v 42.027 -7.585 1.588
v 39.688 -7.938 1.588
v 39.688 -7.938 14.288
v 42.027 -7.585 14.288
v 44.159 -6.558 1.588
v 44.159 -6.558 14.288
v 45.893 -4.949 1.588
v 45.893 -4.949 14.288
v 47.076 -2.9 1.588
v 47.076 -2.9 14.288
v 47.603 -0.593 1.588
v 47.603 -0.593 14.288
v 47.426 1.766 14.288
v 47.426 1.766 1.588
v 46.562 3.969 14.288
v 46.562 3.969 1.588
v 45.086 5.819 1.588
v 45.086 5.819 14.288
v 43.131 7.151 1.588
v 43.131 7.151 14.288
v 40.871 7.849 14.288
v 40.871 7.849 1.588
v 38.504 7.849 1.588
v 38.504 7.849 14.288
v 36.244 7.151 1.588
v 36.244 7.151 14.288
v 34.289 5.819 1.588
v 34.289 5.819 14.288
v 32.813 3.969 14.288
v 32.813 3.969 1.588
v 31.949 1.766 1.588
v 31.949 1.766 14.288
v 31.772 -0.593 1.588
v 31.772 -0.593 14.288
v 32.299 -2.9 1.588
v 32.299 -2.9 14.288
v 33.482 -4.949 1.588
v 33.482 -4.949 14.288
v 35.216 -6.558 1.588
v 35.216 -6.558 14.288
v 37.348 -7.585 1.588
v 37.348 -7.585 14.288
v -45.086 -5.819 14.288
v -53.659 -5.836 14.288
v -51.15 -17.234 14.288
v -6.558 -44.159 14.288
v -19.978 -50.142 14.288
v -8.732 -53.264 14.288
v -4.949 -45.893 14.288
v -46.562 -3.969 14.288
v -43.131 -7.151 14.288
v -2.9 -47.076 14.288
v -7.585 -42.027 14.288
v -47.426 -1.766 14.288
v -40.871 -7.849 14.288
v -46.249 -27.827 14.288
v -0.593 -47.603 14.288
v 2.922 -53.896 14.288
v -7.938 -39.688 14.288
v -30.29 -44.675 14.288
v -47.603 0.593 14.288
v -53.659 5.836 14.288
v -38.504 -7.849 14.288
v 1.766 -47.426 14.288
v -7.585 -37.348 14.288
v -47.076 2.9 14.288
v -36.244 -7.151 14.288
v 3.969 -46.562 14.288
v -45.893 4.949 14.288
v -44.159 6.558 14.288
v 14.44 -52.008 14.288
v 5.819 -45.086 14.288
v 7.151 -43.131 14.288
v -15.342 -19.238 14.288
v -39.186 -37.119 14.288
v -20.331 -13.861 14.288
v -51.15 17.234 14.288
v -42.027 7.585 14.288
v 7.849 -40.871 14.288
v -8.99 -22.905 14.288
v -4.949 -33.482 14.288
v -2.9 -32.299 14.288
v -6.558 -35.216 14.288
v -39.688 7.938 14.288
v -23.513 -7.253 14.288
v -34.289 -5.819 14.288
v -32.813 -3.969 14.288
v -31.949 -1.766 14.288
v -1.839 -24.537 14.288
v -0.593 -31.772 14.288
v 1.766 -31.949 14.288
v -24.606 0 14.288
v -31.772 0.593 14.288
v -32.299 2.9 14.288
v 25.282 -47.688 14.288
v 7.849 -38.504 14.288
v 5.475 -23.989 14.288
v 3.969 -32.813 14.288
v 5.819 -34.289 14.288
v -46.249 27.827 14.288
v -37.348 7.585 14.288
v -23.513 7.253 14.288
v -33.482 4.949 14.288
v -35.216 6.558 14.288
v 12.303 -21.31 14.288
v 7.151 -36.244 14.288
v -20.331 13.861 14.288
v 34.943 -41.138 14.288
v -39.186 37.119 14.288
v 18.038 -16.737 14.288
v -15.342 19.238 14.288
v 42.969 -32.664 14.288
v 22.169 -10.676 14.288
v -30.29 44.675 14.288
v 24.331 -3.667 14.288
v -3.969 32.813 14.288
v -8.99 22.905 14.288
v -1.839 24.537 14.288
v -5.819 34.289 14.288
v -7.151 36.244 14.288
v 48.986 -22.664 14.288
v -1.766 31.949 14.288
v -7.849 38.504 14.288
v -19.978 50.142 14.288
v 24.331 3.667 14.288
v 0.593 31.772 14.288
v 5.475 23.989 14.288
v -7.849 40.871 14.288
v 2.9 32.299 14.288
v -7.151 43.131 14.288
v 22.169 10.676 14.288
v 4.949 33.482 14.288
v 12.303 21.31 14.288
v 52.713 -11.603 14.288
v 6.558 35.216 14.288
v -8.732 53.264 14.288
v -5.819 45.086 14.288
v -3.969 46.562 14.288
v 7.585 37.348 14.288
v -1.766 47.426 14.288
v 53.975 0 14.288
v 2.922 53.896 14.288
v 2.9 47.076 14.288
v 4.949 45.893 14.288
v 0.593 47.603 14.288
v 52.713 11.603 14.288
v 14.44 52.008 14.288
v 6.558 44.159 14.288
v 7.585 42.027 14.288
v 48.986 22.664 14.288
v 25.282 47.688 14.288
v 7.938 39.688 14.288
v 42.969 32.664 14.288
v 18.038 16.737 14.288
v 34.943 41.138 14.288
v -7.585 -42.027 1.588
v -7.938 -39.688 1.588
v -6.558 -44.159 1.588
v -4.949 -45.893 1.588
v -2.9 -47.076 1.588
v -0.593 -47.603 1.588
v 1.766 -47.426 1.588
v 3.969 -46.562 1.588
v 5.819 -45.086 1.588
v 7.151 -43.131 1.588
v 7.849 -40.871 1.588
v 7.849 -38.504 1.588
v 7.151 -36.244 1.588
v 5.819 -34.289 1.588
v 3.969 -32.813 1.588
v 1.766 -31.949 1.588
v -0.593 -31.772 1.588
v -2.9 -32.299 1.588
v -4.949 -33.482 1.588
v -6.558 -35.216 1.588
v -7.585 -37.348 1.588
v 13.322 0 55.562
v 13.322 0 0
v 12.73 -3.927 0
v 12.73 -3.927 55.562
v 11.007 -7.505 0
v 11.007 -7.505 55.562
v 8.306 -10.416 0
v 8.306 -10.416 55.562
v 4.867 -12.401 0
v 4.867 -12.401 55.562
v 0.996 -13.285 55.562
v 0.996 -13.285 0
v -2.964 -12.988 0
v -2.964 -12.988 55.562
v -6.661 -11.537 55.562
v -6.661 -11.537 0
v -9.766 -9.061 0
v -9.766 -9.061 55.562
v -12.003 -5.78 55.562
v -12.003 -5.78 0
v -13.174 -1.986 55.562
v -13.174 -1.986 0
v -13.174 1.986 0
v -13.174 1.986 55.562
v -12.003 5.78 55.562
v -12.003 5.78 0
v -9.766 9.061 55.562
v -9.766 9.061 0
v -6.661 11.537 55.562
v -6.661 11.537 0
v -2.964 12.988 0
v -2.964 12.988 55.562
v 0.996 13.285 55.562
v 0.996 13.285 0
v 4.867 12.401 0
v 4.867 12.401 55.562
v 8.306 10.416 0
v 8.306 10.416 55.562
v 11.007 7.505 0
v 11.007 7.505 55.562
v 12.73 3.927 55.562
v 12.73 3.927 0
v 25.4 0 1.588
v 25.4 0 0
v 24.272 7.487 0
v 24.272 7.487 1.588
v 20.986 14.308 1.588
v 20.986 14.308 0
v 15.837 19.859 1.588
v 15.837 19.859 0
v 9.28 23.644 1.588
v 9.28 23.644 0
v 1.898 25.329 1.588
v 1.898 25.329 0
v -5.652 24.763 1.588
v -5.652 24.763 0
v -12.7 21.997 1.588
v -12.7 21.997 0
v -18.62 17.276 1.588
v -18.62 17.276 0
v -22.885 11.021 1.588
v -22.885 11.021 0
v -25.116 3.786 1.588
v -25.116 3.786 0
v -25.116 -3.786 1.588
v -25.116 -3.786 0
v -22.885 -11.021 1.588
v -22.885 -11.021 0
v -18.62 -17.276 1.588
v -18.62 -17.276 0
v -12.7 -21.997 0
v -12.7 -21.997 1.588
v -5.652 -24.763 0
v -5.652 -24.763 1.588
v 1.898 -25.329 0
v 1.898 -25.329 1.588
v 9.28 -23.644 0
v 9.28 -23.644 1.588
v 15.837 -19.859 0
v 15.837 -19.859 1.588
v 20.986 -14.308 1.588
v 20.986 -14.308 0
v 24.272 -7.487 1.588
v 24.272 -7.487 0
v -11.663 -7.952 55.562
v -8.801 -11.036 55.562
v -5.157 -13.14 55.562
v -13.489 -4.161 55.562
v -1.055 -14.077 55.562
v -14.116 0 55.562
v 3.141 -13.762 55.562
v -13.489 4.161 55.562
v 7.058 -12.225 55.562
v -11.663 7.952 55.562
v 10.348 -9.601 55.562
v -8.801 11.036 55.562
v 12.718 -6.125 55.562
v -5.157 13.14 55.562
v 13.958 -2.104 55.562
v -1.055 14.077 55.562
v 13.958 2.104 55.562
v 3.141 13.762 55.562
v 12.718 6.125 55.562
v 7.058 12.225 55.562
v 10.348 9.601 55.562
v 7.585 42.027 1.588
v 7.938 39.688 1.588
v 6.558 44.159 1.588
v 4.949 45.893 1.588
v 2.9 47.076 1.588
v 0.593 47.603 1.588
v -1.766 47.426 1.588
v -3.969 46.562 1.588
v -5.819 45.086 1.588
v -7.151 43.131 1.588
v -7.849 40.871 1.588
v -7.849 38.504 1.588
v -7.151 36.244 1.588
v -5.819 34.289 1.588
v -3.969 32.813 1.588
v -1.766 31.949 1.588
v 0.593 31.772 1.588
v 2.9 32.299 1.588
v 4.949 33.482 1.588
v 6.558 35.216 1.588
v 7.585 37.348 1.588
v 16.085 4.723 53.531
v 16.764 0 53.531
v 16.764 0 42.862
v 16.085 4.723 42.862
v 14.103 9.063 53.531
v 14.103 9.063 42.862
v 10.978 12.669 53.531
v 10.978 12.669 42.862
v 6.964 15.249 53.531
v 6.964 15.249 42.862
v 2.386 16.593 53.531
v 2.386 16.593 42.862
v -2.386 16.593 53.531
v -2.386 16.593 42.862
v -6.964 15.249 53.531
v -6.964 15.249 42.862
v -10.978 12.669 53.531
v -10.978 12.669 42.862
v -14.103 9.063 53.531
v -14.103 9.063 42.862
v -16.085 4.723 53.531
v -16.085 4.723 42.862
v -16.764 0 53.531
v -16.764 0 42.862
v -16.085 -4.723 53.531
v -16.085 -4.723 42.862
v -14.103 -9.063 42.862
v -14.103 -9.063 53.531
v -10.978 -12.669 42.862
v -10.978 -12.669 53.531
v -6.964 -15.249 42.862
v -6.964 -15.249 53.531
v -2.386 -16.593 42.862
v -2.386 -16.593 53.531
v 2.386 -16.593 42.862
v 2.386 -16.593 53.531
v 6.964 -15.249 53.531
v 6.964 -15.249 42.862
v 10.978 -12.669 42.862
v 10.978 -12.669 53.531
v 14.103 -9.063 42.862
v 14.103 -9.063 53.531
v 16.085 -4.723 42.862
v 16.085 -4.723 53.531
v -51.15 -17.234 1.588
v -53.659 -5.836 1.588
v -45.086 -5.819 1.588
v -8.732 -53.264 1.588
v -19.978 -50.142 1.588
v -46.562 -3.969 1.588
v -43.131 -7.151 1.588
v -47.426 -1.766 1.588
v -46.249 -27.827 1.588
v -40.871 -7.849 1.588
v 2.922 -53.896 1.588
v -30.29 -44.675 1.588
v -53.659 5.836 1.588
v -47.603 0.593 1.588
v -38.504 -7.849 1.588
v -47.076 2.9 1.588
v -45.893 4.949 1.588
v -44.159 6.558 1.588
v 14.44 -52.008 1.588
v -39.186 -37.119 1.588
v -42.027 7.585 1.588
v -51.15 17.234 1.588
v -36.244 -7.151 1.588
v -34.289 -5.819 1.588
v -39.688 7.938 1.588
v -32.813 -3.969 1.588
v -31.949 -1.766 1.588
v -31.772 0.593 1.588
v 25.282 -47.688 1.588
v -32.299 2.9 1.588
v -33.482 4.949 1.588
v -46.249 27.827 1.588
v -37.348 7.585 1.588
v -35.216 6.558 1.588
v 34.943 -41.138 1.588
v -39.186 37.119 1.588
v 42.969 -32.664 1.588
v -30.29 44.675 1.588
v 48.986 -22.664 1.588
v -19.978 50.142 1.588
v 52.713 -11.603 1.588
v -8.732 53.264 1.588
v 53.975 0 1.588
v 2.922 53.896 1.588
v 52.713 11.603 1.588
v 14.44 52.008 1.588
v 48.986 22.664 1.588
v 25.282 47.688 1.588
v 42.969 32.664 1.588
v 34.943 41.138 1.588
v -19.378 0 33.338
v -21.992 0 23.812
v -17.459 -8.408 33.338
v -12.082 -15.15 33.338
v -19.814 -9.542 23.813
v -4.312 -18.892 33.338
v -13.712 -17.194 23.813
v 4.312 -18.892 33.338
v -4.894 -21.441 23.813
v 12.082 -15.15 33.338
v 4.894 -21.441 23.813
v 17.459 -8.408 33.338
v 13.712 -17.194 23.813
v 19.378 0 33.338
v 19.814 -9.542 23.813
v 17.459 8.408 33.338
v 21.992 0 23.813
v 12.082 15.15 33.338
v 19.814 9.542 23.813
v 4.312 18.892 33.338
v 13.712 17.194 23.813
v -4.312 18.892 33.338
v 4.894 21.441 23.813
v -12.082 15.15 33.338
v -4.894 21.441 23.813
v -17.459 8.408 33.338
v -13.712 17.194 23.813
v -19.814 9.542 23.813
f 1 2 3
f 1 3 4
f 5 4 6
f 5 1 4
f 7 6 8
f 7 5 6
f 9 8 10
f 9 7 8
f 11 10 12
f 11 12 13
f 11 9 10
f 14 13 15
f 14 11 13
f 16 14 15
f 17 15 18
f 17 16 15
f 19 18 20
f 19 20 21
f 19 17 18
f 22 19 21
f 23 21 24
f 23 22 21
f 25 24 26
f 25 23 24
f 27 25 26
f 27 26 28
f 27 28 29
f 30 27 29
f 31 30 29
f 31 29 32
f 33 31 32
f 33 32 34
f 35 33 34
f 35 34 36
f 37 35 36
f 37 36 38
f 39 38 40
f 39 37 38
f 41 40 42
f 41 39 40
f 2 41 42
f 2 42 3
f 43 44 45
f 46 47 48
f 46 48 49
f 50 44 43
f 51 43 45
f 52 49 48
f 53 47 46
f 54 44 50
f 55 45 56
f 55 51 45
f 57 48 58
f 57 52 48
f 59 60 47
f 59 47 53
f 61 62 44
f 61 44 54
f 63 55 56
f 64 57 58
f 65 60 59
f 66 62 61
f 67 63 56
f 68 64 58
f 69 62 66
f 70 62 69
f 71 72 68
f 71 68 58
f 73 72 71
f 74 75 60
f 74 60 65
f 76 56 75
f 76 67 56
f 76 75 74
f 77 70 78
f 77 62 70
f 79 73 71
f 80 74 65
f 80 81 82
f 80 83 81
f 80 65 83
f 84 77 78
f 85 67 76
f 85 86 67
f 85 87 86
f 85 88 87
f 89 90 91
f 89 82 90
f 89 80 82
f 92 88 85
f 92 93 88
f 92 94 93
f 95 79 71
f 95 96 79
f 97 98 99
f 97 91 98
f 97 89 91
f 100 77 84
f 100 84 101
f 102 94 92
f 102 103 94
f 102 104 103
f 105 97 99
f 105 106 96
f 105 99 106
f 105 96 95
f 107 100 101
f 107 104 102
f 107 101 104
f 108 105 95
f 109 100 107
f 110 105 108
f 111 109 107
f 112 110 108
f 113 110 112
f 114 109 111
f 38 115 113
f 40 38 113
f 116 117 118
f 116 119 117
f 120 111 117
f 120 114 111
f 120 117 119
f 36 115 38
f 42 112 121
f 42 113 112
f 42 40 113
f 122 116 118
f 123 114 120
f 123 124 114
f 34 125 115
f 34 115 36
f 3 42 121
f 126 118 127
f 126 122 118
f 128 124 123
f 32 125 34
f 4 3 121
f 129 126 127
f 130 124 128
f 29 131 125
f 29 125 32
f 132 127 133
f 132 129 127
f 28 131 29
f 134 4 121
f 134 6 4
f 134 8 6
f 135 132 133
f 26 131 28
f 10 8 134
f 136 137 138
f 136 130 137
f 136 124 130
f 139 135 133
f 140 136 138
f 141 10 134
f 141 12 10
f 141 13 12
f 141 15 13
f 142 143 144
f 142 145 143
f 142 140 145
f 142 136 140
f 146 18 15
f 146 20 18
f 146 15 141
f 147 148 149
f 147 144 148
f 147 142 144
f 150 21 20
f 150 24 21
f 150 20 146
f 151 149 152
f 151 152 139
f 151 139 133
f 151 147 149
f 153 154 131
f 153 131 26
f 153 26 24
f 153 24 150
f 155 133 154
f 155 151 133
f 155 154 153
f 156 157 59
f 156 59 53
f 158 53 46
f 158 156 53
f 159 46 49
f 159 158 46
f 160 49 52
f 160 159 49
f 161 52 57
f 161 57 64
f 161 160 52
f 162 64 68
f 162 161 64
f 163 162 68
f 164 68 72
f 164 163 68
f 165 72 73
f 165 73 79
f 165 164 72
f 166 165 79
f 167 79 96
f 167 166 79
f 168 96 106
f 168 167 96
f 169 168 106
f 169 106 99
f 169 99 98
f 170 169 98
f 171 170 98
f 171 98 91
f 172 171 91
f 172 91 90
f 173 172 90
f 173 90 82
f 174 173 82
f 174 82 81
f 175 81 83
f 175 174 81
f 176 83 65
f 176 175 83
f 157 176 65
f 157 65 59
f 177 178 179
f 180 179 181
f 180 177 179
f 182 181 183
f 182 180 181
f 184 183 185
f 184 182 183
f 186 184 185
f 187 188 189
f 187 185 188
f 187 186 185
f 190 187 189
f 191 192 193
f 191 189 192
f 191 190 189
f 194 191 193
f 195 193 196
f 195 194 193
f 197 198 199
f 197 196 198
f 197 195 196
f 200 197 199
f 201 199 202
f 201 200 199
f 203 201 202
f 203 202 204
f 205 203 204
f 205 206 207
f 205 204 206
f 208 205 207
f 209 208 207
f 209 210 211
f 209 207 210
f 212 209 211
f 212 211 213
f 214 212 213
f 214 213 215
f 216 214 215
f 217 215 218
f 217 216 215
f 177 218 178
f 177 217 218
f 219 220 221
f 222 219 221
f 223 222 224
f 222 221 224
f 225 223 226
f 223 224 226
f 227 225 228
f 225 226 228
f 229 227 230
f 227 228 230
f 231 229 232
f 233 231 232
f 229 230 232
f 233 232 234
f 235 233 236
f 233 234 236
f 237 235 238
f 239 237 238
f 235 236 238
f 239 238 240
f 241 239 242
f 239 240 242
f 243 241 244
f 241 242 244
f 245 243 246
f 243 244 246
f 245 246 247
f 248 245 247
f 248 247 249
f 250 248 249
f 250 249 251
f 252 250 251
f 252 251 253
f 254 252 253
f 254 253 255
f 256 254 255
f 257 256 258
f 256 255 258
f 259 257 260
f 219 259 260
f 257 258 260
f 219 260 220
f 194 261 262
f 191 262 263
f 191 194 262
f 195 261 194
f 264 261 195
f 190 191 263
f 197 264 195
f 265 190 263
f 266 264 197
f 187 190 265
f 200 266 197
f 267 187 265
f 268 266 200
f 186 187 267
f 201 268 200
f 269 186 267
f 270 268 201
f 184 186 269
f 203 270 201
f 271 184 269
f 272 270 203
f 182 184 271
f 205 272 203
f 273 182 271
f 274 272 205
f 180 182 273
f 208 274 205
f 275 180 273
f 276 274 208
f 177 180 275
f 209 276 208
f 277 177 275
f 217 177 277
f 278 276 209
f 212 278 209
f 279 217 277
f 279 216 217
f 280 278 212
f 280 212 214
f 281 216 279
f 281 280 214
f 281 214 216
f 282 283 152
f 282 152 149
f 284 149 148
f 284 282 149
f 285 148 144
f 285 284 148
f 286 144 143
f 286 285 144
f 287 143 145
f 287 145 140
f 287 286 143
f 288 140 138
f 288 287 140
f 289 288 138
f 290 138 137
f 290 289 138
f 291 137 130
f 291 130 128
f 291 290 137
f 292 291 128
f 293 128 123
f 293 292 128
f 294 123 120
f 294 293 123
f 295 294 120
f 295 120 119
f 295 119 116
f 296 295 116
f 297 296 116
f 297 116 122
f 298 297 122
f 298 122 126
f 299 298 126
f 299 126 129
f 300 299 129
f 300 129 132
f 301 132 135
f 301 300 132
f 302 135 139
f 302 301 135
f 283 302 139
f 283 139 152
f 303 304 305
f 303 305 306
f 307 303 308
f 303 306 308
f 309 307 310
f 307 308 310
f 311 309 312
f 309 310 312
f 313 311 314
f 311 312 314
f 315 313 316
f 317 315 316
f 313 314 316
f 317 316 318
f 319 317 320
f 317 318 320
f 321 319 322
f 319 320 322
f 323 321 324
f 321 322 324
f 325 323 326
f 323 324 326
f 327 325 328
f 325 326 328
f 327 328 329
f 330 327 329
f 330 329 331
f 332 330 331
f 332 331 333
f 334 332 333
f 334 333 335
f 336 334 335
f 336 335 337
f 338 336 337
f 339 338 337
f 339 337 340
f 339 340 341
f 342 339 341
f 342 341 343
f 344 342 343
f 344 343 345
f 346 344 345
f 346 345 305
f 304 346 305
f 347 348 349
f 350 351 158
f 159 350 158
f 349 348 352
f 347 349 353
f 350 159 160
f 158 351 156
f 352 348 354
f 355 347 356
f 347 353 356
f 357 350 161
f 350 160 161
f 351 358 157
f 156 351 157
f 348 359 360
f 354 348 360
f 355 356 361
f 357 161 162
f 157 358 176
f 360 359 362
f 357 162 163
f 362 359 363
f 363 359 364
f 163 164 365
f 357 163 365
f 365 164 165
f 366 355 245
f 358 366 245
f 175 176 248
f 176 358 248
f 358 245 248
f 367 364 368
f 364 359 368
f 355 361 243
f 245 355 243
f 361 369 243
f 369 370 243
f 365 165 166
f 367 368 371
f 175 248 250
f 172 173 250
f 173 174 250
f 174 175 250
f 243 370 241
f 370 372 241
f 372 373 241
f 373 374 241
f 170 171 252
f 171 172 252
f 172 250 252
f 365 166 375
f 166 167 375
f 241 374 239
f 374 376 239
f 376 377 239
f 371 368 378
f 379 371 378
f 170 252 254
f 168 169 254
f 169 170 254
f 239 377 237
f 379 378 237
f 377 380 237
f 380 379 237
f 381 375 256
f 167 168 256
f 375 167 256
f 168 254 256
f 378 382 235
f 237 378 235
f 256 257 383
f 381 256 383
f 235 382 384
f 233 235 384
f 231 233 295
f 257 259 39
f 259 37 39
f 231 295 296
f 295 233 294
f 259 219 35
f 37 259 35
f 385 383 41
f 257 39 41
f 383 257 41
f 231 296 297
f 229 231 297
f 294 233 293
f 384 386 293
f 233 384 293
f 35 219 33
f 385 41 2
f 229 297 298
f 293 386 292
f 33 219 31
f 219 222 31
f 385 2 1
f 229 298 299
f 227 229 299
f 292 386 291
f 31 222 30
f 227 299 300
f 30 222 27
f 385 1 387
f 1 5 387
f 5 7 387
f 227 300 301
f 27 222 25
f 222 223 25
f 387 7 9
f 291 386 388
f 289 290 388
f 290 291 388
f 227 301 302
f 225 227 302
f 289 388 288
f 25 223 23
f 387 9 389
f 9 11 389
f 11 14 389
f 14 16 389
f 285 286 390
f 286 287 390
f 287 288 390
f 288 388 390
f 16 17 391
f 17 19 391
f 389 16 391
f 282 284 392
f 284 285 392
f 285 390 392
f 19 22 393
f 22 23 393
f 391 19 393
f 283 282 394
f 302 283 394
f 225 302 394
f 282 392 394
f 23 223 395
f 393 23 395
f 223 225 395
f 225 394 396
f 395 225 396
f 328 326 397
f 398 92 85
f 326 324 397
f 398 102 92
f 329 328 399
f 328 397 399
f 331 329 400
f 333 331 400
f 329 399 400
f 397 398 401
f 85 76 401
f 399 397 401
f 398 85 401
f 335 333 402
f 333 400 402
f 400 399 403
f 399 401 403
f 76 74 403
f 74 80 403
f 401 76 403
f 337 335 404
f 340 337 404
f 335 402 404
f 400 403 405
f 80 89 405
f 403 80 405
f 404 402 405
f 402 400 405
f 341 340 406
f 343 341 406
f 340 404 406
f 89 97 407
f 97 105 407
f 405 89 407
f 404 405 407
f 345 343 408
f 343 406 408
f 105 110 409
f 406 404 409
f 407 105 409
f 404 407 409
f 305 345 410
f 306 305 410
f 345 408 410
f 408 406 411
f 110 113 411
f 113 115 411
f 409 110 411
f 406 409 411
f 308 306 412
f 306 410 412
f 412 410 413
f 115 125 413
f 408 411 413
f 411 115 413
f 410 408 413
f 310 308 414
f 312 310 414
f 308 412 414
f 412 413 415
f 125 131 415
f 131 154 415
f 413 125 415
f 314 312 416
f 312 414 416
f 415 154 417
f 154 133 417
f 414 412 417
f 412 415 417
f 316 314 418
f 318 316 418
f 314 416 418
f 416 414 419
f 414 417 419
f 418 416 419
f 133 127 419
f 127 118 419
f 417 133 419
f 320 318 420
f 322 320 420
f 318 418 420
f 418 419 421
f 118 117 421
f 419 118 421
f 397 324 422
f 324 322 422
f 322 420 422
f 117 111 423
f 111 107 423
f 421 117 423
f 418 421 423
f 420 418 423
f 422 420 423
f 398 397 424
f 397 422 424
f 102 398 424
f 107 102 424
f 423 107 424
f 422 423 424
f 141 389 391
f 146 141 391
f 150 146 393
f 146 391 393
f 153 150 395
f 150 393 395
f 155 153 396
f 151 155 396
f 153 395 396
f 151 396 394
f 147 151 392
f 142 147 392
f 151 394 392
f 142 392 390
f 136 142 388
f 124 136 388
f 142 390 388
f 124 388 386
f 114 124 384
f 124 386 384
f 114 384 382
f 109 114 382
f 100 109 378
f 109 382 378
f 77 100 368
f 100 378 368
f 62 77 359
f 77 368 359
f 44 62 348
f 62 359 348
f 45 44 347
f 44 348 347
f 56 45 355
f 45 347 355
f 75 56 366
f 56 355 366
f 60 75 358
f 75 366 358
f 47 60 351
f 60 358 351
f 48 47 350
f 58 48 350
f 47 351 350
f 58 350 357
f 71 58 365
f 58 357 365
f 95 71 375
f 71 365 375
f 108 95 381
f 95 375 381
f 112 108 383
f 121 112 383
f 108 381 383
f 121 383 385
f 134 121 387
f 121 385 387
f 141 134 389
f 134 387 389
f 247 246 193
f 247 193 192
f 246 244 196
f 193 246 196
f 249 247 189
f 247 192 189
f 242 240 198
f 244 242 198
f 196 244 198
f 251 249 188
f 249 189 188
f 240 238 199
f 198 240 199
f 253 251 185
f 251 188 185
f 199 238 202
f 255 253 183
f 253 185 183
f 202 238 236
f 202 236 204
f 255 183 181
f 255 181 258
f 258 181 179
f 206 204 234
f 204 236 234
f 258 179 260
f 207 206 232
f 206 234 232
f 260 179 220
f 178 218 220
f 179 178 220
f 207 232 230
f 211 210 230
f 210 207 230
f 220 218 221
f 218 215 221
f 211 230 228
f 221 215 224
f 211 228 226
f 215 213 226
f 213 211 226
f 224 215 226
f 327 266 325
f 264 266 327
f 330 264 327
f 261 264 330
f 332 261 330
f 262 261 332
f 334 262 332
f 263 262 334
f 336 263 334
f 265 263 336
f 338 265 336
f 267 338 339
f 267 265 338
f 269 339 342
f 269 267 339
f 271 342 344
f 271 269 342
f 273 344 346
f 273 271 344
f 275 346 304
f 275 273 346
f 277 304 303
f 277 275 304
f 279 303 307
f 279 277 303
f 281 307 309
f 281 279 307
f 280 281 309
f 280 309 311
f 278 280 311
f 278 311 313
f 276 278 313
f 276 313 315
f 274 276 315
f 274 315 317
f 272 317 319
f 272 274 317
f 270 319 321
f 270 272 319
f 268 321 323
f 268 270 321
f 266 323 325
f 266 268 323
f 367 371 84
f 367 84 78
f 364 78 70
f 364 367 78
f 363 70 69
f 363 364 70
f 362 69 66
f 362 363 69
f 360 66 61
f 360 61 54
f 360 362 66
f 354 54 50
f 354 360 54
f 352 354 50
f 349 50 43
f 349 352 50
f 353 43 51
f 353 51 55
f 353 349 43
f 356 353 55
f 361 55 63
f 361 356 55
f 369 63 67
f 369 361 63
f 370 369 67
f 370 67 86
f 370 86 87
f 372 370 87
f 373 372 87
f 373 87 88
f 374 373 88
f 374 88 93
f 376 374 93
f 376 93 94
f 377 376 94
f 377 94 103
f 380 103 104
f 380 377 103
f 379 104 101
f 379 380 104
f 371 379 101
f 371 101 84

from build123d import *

# Parameters (mm, degrees)
SKETCH1_R         = 25.4
EXTRUDE1_DEPTH    = 1.5875
EXTRUDE2_START    = 1.5875
SKETCH1_3_R       = 53.975
EXTRUDE2_DEPTH    = 12.7
EXTRUDE3_START    = 14.2875
SKETCH1_4_R       = 16.764
EXTRUDE3_DEPTH    = 41.275
EXTRUDE4_START    = 1.5875
SKETCH1_5_R       = 7.9375
EXTRUDE4_DEPTH    = 12.7
CIRPATTERN1_COUNT = 4
EXTRUDE5_REACH    = 96.413
SKETCH3_R         = 13.3223


with BuildPart() as part:
    # Sketch1 → Extrude1 (new body)
    with BuildSketch(Plane.XY):
        Circle(SKETCH1_R)
    extrude(amount=EXTRUDE1_DEPTH)

    # Sketch1<3> → Extrude2 (add)
    with BuildSketch(Plane.XY.offset(EXTRUDE2_START)):
        Circle(SKETCH1_3_R)
    extrude(amount=EXTRUDE2_DEPTH)

    # Sketch1<4> → Extrude3 (add)
    with BuildSketch(Plane.XY.offset(EXTRUDE3_START)):
        Circle(SKETCH1_4_R)
    extrude(amount=EXTRUDE3_DEPTH)

    # Sketch4 → Revolve1 (revolve)
    with BuildSketch(Plane(origin=(0, 0, 0), x_dir=(0, 0, -1), z_dir=(1, 0, 0)), mode=Mode.PRIVATE) as revolve1_sk:
        Polygon((-42.8625, 16.764), (-14.2875, 24.60625), (-14.2875, 16.764), align=None)
    revolve(revolve1_sk.sketch.rotate(Axis((0, 0, -2.619375), (0, 0, 1)), 90), axis=Axis((0, 0, -2.619375), (0, 0, 1)))

    # Sketch1<5> → Extrude4 (cut)
    with BuildSketch(Plane.XY.offset(EXTRUDE4_START)):
        with Locations((0, 39.6875)):
            Circle(SKETCH1_5_R)
    extrude4 = extrude(amount=EXTRUDE4_DEPTH, mode=Mode.SUBTRACT)

    # CirPattern1: Extrude4 ×4 about axis
    cirpattern1_axis = Axis((0, 0, 0), (0, 0, 1))
    for i in range(1, CIRPATTERN1_COUNT):
        add(extrude4.rotate(cirpattern1_axis, i * 360 / CIRPATTERN1_COUNT), mode=Mode.SUBTRACT)

    # Sketch3 → Extrude5 (cut, up to next)
    with BuildSketch(Plane(origin=(0, 0, 55.5625), x_dir=(-1, 0, 0), z_dir=(0, 0, -1)), mode=Mode.PRIVATE) as extrude5_sk1:
        with Locations(Location((0, 0, 0), (0, 0, 180))):
            Circle(SKETCH3_R)
    extrude5_tool1 = extrude(extrude5_sk1.sketch, amount=EXTRUDE5_REACH, mode=Mode.PRIVATE) & part.part
    add(extrude5_tool1.solids().sort_by_distance((0, 0, 55.5625))[0], mode=Mode.SUBTRACT)

    # Sketch5 → Cut-Revolve1 (revolve, cut)
    with BuildSketch(Plane(origin=(0, 0, 0), x_dir=(0, 0, -1), z_dir=(1, 0, 0)), mode=Mode.PRIVATE) as cut_revolve1_sk:
        Polygon((-55.5625, 16.764), (-53.530656502, 16.764), (-55.5625, 14.11605), align=None)
    revolve(cut_revolve1_sk.sketch.rotate(Axis((0, 0, -2.619375), (0, 0, 1)), 90), axis=Axis((0, 0, -2.619375), (0, 0, 1)), mode=Mode.SUBTRACT)


solid = part.part
